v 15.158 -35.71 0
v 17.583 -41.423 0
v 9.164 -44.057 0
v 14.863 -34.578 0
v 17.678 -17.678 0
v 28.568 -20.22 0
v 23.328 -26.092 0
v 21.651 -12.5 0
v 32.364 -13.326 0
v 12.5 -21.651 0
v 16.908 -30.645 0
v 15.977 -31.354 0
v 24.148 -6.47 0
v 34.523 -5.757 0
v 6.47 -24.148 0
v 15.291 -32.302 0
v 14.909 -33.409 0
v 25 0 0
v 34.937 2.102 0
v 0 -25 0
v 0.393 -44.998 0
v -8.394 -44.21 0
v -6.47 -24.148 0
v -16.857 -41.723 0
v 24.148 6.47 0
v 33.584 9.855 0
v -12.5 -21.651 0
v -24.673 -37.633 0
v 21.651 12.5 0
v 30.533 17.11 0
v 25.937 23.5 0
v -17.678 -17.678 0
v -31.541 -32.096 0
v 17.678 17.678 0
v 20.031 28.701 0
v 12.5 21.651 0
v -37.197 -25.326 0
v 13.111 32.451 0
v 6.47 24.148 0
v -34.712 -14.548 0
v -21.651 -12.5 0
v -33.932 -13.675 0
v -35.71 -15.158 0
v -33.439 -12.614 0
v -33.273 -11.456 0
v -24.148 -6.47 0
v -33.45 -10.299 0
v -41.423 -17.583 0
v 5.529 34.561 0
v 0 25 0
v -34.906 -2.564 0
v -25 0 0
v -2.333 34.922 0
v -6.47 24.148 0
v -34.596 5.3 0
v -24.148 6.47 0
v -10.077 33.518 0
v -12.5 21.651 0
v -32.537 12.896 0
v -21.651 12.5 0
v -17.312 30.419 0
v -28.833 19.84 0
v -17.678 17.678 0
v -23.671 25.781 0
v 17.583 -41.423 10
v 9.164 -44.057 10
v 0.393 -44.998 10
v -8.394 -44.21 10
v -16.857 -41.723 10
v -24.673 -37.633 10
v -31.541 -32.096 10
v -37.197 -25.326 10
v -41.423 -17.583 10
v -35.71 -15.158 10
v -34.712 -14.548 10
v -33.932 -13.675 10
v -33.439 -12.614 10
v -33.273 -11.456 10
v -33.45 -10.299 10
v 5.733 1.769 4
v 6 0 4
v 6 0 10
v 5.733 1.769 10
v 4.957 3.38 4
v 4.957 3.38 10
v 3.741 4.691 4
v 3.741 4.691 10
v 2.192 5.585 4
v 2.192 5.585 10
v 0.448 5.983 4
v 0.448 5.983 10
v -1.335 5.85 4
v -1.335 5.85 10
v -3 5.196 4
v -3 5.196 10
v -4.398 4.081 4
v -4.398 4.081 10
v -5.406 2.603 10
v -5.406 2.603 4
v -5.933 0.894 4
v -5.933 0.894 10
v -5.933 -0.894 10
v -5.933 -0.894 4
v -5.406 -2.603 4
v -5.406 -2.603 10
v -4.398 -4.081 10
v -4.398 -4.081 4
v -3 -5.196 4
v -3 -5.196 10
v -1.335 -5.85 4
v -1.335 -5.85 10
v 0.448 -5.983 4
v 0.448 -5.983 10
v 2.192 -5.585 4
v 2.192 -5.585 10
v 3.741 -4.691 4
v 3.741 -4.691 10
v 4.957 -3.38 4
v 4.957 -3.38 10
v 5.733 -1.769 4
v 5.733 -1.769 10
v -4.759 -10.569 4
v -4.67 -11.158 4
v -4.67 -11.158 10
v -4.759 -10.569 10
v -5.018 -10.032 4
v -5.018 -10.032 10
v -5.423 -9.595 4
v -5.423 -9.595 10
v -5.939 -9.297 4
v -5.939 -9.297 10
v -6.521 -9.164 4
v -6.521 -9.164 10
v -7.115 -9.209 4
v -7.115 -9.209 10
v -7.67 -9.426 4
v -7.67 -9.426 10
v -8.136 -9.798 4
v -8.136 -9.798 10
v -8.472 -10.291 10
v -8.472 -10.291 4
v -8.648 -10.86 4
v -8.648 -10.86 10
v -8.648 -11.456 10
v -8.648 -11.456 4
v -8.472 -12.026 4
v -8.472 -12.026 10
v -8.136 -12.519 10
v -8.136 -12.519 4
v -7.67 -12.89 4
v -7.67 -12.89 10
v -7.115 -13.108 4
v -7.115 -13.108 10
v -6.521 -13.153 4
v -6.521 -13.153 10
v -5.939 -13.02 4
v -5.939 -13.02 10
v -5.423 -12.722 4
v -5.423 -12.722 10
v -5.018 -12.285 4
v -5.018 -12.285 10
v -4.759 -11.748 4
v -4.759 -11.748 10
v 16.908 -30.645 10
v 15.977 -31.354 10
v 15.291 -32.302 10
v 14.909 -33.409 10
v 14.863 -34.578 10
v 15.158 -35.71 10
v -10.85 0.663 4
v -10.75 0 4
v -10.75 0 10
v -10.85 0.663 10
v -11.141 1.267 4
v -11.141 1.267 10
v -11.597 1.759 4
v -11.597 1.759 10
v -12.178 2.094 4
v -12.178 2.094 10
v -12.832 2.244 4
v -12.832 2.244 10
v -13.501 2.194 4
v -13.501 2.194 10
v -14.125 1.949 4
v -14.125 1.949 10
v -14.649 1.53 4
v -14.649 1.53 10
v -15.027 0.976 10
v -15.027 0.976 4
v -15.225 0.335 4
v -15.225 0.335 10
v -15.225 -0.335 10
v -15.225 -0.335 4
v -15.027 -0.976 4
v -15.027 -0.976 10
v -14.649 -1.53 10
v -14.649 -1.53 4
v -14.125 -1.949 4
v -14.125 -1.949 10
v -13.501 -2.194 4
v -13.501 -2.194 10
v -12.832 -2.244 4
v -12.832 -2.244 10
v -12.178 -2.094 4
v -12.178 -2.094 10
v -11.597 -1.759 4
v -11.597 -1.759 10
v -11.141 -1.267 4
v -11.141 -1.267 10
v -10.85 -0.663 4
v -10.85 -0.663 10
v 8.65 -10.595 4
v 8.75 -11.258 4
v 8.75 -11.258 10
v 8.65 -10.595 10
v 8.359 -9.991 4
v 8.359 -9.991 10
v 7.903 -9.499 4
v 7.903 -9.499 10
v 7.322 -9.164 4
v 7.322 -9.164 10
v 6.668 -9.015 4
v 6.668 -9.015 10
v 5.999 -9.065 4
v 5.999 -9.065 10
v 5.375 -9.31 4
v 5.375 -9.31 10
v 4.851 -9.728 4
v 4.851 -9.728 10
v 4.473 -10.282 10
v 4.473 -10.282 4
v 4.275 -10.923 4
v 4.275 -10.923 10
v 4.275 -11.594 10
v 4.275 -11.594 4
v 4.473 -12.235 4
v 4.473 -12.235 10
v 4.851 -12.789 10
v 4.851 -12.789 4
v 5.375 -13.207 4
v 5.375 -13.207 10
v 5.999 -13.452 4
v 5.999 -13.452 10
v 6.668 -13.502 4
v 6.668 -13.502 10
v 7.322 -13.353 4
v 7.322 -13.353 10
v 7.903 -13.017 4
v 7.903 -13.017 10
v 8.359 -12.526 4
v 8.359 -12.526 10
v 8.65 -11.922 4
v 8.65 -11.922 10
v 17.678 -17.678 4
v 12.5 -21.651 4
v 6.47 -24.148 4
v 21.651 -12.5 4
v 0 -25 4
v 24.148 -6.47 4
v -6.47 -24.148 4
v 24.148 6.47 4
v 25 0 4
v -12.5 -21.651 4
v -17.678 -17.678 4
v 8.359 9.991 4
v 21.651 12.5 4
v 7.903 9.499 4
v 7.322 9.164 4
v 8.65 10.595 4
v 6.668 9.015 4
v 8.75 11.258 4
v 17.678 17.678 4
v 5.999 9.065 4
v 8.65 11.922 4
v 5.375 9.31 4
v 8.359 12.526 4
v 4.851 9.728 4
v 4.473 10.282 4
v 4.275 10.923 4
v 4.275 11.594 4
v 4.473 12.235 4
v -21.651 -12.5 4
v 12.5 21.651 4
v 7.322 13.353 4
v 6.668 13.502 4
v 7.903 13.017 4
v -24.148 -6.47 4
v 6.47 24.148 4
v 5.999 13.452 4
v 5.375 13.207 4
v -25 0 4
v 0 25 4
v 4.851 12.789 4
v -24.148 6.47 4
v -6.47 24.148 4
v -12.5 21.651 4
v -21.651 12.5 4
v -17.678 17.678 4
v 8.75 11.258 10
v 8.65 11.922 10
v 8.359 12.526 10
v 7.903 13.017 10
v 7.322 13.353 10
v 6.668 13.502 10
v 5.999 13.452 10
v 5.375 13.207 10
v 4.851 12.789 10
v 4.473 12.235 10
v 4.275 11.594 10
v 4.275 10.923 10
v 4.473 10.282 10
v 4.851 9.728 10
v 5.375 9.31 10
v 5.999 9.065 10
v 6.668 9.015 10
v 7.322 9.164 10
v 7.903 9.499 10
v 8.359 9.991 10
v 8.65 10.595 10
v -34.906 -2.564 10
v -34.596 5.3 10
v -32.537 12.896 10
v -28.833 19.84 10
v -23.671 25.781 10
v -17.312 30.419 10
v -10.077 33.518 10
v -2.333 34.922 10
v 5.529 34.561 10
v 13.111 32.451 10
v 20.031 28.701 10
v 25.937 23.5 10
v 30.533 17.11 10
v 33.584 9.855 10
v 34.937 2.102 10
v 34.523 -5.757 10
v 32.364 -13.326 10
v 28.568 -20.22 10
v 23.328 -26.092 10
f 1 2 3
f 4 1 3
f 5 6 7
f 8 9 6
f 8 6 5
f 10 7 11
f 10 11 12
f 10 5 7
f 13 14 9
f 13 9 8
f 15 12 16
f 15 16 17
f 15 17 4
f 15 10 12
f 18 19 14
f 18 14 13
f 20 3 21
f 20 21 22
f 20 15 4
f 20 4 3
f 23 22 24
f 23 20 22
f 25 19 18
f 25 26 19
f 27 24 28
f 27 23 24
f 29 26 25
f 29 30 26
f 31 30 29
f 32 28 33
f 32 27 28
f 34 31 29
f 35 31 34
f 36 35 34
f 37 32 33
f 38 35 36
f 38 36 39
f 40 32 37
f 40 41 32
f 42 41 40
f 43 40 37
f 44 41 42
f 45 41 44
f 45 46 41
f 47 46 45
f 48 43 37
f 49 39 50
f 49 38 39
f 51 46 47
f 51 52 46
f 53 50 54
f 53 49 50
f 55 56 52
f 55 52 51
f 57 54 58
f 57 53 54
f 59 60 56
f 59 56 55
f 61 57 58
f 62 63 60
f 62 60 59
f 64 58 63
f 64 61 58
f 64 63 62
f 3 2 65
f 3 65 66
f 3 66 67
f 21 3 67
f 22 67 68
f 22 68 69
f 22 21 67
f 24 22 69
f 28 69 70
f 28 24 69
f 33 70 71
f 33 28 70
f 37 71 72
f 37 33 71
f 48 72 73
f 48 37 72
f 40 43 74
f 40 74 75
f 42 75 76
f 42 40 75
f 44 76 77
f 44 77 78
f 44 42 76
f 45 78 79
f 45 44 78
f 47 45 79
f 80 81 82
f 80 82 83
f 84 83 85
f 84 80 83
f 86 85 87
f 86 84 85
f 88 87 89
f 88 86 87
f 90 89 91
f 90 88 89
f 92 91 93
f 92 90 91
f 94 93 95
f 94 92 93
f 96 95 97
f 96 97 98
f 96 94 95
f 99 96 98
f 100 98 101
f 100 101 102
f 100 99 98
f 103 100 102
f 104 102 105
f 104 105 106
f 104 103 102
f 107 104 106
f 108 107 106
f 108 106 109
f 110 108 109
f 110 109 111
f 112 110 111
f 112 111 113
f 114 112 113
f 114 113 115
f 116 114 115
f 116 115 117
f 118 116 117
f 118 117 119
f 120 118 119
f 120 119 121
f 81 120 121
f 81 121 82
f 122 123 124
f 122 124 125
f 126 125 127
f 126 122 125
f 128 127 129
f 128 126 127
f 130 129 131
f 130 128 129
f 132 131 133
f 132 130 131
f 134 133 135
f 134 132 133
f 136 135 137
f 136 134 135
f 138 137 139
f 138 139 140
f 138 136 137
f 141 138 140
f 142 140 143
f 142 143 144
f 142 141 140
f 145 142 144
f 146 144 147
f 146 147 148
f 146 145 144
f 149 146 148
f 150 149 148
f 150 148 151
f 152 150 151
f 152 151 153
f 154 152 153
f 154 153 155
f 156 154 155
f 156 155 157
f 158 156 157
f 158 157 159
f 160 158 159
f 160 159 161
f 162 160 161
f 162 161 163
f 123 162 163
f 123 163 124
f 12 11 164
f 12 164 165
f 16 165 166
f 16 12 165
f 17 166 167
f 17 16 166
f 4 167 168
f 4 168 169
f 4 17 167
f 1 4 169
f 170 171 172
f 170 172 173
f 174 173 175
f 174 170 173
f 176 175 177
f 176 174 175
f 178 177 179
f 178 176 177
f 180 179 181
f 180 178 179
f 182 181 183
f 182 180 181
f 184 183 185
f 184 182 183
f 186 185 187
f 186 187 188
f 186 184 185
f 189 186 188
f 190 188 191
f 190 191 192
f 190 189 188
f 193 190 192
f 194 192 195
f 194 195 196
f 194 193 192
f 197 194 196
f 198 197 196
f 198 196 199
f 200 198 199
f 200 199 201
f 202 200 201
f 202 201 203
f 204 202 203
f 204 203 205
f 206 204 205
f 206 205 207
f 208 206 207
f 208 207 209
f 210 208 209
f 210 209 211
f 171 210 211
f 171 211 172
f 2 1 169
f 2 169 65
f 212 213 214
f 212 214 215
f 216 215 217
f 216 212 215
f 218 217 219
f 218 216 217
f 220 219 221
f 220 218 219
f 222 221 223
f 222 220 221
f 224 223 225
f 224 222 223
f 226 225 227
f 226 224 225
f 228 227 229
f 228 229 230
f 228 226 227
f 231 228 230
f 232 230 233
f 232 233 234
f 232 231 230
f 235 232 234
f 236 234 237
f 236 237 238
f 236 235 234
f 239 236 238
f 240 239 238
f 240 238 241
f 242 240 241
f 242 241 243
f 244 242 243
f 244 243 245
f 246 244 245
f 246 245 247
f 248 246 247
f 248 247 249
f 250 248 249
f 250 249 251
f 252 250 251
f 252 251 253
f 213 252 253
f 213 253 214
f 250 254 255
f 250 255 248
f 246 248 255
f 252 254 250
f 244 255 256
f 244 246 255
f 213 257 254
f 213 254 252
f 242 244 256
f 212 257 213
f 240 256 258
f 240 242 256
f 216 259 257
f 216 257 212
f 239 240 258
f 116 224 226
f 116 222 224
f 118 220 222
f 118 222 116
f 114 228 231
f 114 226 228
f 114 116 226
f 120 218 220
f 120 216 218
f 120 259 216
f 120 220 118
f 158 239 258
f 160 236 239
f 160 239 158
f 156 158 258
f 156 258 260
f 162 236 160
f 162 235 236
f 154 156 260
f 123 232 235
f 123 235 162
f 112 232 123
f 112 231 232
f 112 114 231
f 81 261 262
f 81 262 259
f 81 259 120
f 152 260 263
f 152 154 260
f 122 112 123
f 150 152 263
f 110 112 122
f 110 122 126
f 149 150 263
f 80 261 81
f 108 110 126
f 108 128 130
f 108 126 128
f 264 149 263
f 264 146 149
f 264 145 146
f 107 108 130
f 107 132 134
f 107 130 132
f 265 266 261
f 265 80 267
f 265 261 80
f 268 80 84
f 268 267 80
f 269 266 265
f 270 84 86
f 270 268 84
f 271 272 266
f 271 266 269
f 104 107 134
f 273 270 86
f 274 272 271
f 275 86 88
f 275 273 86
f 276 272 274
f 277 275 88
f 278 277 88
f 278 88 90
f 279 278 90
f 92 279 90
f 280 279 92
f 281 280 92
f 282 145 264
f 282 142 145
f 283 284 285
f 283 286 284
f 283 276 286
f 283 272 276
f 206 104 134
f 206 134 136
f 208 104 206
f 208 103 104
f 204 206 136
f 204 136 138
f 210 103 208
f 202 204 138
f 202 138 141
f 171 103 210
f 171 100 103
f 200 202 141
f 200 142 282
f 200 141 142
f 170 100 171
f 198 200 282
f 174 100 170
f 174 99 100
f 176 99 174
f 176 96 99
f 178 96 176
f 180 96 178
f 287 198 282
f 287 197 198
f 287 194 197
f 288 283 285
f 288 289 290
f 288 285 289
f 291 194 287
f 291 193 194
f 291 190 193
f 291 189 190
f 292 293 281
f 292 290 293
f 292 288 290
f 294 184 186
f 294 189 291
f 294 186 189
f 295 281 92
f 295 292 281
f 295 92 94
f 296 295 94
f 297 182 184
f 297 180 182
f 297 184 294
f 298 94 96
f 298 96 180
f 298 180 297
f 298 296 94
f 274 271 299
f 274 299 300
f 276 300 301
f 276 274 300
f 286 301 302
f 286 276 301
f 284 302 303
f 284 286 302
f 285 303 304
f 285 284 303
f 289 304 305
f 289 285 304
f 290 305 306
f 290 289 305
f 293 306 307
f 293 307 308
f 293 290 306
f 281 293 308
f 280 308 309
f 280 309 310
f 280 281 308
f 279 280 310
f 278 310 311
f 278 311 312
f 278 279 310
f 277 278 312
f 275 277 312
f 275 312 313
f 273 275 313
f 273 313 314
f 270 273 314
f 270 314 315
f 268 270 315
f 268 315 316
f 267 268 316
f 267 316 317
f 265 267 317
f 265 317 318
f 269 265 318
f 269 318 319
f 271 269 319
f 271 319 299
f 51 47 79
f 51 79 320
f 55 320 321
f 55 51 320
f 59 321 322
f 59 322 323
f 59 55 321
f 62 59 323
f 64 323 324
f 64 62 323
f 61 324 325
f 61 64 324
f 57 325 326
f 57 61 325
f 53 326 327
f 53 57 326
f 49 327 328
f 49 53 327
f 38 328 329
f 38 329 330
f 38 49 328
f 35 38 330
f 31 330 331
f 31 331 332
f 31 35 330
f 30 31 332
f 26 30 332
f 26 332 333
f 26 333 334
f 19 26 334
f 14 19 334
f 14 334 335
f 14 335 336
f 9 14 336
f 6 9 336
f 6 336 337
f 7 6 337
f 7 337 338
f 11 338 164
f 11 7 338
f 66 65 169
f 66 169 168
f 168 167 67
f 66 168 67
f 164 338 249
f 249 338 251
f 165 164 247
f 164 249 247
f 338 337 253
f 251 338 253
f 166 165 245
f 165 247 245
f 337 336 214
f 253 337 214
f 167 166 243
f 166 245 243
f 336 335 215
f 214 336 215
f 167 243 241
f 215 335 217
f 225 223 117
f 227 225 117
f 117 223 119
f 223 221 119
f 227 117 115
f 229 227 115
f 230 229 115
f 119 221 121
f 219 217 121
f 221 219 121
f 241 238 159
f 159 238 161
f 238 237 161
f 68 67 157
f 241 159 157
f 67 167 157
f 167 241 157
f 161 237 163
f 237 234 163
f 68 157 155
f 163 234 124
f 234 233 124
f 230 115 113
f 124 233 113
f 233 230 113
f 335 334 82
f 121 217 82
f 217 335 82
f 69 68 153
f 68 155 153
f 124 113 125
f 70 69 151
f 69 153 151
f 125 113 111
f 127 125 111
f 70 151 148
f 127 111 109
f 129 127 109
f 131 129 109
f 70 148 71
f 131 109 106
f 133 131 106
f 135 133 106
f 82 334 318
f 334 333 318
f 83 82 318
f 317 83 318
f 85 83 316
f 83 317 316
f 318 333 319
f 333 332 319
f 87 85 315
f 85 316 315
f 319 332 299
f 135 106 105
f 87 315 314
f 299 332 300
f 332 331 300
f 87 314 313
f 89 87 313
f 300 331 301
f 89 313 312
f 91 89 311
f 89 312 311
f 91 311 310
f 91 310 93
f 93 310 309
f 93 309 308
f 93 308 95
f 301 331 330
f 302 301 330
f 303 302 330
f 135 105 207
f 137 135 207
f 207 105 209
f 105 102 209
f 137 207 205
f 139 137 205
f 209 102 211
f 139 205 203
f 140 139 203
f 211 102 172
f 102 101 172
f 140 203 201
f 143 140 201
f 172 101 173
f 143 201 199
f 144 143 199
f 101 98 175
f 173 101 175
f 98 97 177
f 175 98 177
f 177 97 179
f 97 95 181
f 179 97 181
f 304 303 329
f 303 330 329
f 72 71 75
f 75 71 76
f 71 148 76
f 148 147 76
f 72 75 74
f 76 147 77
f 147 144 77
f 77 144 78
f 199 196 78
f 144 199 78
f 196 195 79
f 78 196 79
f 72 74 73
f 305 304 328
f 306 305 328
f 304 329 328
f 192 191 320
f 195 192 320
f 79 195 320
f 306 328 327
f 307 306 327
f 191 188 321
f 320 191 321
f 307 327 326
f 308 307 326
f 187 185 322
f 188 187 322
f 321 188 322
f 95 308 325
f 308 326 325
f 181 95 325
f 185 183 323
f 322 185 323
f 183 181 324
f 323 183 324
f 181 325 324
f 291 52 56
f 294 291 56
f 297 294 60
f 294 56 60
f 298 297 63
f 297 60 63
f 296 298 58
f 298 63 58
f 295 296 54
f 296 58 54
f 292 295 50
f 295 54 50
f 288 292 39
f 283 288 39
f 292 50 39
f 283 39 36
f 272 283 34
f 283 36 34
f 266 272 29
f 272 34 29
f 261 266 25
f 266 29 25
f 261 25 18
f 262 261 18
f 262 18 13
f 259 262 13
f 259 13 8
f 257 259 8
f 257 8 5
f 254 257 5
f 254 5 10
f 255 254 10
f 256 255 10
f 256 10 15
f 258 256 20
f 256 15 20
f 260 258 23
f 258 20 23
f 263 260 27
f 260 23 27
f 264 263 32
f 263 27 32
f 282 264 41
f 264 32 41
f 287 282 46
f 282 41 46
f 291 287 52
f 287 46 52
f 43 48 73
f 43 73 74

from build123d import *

# Parameters (mm, degrees)
ESQUISSE1_R             = 2.25
ESQUISSE1_R_2           = 6
ESQUISSE1_R_3           = 2
EXTRUSION1_DEPTH        = 10
ESQUISSE2_R             = 25
ENL_V_MAT_EXTRU_1_DEPTH = 4


with BuildPart() as part:
    # Esquisse1 → Extrusion1 (new body)
    with BuildSketch(Plane.XY):
        with BuildLine():
            Line((15.158152138, -35.710368575), (17.582900782, -41.422718405))
            ThreePointArc((17.582900782, -41.422718405), (-16.857296704, -41.723273456), (-41.422718405, -17.582900782))
            Line((-41.422718405, -17.582900782), (-35.710368575, -15.158152138))
            ThreePointArc((-35.710368575, -15.158152138), (-33.646394386, -13.163025073), (-33.450391234, -10.29909347))
            ThreePointArc((-33.450391234, -10.29909347), (13.11123077, 32.45143491), (16.907846264, -30.645142106))
            ThreePointArc((16.907846264, -30.645142106), (15.059385072, -32.841437324), (15.158152138, -35.710368575))
        make_face()
        with Locations((-13, 0)):
            Circle(ESQUISSE1_R, mode=Mode.SUBTRACT)
        with Locations((6.5, 11.258330249)):
            Circle(ESQUISSE1_R, mode=Mode.SUBTRACT)
        with Locations((6.5, -11.258330249)):
            Circle(ESQUISSE1_R, mode=Mode.SUBTRACT)
        Circle(ESQUISSE1_R_2, mode=Mode.SUBTRACT)
        with Locations((-6.670127311, -11.158378093)):
            Circle(ESQUISSE1_R_3, mode=Mode.SUBTRACT)
    extrude(amount=EXTRUSION1_DEPTH)

    # Esquisse2 → Enlèv. mat.-Extru.1 (cut)
    with BuildSketch(Plane(origin=(0, 0, 0), x_dir=(-1, 0, 0), z_dir=(0, 0, -1))):
        Circle(ESQUISSE2_R)
    extrude(amount=-ENL_V_MAT_EXTRU_1_DEPTH, mode=Mode.SUBTRACT)


solid = part.part
